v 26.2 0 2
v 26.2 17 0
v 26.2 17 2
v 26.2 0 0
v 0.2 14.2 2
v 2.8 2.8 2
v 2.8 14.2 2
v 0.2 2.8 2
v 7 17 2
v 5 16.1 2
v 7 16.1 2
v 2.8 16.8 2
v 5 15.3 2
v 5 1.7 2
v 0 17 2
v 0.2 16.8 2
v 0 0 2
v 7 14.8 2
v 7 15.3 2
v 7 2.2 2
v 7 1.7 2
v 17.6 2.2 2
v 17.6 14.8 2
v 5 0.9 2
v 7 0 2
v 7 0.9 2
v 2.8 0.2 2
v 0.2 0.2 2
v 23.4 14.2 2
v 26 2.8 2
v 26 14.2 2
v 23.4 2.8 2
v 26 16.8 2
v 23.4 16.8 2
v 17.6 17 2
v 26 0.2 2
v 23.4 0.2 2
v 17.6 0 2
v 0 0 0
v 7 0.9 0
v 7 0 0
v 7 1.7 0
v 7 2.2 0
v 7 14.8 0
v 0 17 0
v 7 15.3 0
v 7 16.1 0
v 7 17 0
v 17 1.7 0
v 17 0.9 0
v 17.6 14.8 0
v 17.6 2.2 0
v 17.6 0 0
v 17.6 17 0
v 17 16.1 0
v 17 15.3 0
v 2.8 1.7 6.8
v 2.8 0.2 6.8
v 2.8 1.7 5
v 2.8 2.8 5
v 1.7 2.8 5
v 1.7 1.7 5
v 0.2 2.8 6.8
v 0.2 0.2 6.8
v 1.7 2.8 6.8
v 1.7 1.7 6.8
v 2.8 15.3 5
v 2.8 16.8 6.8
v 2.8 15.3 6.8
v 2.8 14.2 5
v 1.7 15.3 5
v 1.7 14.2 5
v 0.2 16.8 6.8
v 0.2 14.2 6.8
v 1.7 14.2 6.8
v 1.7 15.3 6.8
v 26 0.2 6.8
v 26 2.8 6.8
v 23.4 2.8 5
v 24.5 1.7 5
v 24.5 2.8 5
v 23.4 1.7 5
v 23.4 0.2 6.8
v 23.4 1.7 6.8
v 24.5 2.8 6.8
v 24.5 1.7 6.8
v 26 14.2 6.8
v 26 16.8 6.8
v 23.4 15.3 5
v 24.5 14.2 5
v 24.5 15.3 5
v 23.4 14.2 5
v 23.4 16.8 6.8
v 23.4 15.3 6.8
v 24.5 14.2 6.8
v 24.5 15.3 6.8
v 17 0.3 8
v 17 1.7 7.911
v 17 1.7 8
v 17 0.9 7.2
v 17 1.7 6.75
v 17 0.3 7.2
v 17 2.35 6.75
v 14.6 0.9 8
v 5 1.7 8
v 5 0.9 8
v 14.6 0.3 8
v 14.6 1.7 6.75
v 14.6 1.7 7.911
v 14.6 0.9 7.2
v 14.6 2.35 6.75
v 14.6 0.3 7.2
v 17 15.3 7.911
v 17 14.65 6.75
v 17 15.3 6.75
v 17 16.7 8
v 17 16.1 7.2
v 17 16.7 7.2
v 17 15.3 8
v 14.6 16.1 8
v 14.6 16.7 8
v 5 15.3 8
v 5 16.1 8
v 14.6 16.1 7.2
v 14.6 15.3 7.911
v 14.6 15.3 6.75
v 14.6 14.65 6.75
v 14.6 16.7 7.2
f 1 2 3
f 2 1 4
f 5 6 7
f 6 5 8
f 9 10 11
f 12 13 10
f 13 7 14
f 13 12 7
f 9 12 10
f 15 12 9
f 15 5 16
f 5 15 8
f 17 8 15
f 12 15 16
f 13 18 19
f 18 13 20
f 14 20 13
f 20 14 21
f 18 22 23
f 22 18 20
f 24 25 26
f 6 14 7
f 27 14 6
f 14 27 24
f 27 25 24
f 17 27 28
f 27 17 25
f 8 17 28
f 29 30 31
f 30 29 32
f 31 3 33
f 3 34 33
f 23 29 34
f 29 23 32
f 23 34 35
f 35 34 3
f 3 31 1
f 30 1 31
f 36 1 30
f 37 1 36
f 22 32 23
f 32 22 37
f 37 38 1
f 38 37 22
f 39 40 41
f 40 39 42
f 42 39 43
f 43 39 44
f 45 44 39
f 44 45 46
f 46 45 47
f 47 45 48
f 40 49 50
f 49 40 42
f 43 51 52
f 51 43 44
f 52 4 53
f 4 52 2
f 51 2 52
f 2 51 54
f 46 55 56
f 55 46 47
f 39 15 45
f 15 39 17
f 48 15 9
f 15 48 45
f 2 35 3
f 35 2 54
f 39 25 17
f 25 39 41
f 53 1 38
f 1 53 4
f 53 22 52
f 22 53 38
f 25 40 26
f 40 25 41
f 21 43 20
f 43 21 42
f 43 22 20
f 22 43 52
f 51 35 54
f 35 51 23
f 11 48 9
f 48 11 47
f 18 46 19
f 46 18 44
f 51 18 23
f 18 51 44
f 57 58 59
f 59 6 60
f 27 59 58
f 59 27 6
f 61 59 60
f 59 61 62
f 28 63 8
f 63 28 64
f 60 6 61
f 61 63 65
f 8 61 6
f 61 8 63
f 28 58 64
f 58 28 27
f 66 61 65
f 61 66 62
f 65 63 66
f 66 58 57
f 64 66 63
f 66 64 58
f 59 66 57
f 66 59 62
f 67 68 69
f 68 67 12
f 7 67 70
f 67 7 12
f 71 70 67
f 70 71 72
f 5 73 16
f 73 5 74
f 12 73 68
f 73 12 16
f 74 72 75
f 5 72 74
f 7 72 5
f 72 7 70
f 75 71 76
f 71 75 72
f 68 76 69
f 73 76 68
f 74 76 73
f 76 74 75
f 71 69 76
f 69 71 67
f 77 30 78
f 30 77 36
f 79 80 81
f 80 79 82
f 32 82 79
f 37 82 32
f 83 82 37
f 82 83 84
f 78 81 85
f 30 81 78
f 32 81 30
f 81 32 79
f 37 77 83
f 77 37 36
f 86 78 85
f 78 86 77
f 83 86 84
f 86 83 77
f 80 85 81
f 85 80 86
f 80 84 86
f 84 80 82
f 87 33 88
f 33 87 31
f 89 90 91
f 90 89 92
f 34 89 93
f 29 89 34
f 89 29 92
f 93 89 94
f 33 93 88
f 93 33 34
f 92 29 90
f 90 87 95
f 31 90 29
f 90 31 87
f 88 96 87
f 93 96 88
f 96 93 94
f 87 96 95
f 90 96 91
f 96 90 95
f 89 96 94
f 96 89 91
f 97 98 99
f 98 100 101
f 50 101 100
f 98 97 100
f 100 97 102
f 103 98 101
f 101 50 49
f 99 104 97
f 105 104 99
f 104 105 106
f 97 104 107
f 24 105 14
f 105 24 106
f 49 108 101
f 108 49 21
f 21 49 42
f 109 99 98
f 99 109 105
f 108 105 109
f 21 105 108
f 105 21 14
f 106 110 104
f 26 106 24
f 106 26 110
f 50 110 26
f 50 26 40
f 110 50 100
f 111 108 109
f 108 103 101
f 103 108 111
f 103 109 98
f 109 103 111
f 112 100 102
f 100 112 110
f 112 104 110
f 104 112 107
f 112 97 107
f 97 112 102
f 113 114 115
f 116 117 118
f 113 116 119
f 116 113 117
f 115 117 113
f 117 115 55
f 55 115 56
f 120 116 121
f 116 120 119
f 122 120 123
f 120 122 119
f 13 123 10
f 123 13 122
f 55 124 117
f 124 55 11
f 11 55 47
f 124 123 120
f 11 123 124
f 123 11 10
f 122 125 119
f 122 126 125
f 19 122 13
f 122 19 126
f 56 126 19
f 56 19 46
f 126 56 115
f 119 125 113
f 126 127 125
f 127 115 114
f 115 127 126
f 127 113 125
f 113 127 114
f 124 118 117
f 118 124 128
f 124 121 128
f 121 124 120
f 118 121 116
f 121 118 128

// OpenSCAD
// Sample with flexible side latches, v0.9. Millimetres.
translate([-6.0, -16.0, 0]) union(){
difference(){
translate([6.0, 16.0, 0]) cube([26.2, 17.0, 2.0]);
translate([13.0, 15.9, -0.1]) cube([10.6, 2.3, 2.2]);
translate([13.0, 30.8, -0.1]) cube([10.6, 2.3, 2.2]);
}
union(){
translate([6.2, 16.2, 2.0]) cube([2.6, 2.6, 3.0]);
translate([6.2, 16.2, 2.0]) cube([1.5, 2.6, 4.8]);
translate([6.2, 16.2, 2.0]) cube([2.6, 1.5, 4.8]);
translate([6.2, 30.2, 2.0]) cube([2.6, 2.6, 3.0]);
translate([6.2, 30.2, 2.0]) cube([1.5, 2.6, 4.8]);
translate([6.2, 31.3, 2.0]) cube([2.6, 1.5, 4.8]);
translate([29.4, 16.2, 2.0]) cube([2.6, 2.6, 3.0]);
translate([30.5, 16.2, 2.0]) cube([1.5, 2.6, 4.8]);
translate([29.4, 16.2, 2.0]) cube([2.6, 1.5, 4.8]);
translate([29.4, 30.2, 2.0]) cube([2.6, 2.6, 3.0]);
translate([30.5, 30.2, 2.0]) cube([1.5, 2.6, 4.8]);
translate([29.4, 31.3, 2.0]) cube([2.6, 1.5, 4.8]);
}
union(){
translate([11.0, 16.9, 0]) cube([12.0, 0.8, 8.0]);
polyhedron(points=[[20.6, 18.35, 6.75], [23.0, 18.35, 6.75], [20.6, 17.65, 6.75], [23.0, 17.65, 6.75], [20.6, 17.65, 8.0], [23.0, 17.65, 8.0]],faces=[[0, 2, 4], [1, 5, 3], [0, 1, 3], [0, 3, 2], [2, 3, 5], [2, 5, 4], [4, 5, 1], [4, 1, 0]]);
translate([20.6, 16.299999999999997, 7.2]) cube([2.4, 0.65, 0.8]);
}
union(){
translate([11.0, 31.3, 0]) cube([12.0, 0.8, 8.0]);
polyhedron(points=[[20.6, 30.65, 6.75], [23.0, 30.65, 6.75], [20.6, 31.35, 6.75], [23.0, 31.35, 6.75], [20.6, 31.35, 8.0], [23.0, 31.35, 8.0]],faces=[[4, 2, 0], [3, 5, 1], [3, 1, 0], [2, 3, 0], [5, 3, 2], [4, 5, 2], [1, 5, 4], [0, 1, 4]]);
translate([20.6, 32.050000000000004, 7.2]) cube([2.4, 0.65, 0.8]);
}
}
